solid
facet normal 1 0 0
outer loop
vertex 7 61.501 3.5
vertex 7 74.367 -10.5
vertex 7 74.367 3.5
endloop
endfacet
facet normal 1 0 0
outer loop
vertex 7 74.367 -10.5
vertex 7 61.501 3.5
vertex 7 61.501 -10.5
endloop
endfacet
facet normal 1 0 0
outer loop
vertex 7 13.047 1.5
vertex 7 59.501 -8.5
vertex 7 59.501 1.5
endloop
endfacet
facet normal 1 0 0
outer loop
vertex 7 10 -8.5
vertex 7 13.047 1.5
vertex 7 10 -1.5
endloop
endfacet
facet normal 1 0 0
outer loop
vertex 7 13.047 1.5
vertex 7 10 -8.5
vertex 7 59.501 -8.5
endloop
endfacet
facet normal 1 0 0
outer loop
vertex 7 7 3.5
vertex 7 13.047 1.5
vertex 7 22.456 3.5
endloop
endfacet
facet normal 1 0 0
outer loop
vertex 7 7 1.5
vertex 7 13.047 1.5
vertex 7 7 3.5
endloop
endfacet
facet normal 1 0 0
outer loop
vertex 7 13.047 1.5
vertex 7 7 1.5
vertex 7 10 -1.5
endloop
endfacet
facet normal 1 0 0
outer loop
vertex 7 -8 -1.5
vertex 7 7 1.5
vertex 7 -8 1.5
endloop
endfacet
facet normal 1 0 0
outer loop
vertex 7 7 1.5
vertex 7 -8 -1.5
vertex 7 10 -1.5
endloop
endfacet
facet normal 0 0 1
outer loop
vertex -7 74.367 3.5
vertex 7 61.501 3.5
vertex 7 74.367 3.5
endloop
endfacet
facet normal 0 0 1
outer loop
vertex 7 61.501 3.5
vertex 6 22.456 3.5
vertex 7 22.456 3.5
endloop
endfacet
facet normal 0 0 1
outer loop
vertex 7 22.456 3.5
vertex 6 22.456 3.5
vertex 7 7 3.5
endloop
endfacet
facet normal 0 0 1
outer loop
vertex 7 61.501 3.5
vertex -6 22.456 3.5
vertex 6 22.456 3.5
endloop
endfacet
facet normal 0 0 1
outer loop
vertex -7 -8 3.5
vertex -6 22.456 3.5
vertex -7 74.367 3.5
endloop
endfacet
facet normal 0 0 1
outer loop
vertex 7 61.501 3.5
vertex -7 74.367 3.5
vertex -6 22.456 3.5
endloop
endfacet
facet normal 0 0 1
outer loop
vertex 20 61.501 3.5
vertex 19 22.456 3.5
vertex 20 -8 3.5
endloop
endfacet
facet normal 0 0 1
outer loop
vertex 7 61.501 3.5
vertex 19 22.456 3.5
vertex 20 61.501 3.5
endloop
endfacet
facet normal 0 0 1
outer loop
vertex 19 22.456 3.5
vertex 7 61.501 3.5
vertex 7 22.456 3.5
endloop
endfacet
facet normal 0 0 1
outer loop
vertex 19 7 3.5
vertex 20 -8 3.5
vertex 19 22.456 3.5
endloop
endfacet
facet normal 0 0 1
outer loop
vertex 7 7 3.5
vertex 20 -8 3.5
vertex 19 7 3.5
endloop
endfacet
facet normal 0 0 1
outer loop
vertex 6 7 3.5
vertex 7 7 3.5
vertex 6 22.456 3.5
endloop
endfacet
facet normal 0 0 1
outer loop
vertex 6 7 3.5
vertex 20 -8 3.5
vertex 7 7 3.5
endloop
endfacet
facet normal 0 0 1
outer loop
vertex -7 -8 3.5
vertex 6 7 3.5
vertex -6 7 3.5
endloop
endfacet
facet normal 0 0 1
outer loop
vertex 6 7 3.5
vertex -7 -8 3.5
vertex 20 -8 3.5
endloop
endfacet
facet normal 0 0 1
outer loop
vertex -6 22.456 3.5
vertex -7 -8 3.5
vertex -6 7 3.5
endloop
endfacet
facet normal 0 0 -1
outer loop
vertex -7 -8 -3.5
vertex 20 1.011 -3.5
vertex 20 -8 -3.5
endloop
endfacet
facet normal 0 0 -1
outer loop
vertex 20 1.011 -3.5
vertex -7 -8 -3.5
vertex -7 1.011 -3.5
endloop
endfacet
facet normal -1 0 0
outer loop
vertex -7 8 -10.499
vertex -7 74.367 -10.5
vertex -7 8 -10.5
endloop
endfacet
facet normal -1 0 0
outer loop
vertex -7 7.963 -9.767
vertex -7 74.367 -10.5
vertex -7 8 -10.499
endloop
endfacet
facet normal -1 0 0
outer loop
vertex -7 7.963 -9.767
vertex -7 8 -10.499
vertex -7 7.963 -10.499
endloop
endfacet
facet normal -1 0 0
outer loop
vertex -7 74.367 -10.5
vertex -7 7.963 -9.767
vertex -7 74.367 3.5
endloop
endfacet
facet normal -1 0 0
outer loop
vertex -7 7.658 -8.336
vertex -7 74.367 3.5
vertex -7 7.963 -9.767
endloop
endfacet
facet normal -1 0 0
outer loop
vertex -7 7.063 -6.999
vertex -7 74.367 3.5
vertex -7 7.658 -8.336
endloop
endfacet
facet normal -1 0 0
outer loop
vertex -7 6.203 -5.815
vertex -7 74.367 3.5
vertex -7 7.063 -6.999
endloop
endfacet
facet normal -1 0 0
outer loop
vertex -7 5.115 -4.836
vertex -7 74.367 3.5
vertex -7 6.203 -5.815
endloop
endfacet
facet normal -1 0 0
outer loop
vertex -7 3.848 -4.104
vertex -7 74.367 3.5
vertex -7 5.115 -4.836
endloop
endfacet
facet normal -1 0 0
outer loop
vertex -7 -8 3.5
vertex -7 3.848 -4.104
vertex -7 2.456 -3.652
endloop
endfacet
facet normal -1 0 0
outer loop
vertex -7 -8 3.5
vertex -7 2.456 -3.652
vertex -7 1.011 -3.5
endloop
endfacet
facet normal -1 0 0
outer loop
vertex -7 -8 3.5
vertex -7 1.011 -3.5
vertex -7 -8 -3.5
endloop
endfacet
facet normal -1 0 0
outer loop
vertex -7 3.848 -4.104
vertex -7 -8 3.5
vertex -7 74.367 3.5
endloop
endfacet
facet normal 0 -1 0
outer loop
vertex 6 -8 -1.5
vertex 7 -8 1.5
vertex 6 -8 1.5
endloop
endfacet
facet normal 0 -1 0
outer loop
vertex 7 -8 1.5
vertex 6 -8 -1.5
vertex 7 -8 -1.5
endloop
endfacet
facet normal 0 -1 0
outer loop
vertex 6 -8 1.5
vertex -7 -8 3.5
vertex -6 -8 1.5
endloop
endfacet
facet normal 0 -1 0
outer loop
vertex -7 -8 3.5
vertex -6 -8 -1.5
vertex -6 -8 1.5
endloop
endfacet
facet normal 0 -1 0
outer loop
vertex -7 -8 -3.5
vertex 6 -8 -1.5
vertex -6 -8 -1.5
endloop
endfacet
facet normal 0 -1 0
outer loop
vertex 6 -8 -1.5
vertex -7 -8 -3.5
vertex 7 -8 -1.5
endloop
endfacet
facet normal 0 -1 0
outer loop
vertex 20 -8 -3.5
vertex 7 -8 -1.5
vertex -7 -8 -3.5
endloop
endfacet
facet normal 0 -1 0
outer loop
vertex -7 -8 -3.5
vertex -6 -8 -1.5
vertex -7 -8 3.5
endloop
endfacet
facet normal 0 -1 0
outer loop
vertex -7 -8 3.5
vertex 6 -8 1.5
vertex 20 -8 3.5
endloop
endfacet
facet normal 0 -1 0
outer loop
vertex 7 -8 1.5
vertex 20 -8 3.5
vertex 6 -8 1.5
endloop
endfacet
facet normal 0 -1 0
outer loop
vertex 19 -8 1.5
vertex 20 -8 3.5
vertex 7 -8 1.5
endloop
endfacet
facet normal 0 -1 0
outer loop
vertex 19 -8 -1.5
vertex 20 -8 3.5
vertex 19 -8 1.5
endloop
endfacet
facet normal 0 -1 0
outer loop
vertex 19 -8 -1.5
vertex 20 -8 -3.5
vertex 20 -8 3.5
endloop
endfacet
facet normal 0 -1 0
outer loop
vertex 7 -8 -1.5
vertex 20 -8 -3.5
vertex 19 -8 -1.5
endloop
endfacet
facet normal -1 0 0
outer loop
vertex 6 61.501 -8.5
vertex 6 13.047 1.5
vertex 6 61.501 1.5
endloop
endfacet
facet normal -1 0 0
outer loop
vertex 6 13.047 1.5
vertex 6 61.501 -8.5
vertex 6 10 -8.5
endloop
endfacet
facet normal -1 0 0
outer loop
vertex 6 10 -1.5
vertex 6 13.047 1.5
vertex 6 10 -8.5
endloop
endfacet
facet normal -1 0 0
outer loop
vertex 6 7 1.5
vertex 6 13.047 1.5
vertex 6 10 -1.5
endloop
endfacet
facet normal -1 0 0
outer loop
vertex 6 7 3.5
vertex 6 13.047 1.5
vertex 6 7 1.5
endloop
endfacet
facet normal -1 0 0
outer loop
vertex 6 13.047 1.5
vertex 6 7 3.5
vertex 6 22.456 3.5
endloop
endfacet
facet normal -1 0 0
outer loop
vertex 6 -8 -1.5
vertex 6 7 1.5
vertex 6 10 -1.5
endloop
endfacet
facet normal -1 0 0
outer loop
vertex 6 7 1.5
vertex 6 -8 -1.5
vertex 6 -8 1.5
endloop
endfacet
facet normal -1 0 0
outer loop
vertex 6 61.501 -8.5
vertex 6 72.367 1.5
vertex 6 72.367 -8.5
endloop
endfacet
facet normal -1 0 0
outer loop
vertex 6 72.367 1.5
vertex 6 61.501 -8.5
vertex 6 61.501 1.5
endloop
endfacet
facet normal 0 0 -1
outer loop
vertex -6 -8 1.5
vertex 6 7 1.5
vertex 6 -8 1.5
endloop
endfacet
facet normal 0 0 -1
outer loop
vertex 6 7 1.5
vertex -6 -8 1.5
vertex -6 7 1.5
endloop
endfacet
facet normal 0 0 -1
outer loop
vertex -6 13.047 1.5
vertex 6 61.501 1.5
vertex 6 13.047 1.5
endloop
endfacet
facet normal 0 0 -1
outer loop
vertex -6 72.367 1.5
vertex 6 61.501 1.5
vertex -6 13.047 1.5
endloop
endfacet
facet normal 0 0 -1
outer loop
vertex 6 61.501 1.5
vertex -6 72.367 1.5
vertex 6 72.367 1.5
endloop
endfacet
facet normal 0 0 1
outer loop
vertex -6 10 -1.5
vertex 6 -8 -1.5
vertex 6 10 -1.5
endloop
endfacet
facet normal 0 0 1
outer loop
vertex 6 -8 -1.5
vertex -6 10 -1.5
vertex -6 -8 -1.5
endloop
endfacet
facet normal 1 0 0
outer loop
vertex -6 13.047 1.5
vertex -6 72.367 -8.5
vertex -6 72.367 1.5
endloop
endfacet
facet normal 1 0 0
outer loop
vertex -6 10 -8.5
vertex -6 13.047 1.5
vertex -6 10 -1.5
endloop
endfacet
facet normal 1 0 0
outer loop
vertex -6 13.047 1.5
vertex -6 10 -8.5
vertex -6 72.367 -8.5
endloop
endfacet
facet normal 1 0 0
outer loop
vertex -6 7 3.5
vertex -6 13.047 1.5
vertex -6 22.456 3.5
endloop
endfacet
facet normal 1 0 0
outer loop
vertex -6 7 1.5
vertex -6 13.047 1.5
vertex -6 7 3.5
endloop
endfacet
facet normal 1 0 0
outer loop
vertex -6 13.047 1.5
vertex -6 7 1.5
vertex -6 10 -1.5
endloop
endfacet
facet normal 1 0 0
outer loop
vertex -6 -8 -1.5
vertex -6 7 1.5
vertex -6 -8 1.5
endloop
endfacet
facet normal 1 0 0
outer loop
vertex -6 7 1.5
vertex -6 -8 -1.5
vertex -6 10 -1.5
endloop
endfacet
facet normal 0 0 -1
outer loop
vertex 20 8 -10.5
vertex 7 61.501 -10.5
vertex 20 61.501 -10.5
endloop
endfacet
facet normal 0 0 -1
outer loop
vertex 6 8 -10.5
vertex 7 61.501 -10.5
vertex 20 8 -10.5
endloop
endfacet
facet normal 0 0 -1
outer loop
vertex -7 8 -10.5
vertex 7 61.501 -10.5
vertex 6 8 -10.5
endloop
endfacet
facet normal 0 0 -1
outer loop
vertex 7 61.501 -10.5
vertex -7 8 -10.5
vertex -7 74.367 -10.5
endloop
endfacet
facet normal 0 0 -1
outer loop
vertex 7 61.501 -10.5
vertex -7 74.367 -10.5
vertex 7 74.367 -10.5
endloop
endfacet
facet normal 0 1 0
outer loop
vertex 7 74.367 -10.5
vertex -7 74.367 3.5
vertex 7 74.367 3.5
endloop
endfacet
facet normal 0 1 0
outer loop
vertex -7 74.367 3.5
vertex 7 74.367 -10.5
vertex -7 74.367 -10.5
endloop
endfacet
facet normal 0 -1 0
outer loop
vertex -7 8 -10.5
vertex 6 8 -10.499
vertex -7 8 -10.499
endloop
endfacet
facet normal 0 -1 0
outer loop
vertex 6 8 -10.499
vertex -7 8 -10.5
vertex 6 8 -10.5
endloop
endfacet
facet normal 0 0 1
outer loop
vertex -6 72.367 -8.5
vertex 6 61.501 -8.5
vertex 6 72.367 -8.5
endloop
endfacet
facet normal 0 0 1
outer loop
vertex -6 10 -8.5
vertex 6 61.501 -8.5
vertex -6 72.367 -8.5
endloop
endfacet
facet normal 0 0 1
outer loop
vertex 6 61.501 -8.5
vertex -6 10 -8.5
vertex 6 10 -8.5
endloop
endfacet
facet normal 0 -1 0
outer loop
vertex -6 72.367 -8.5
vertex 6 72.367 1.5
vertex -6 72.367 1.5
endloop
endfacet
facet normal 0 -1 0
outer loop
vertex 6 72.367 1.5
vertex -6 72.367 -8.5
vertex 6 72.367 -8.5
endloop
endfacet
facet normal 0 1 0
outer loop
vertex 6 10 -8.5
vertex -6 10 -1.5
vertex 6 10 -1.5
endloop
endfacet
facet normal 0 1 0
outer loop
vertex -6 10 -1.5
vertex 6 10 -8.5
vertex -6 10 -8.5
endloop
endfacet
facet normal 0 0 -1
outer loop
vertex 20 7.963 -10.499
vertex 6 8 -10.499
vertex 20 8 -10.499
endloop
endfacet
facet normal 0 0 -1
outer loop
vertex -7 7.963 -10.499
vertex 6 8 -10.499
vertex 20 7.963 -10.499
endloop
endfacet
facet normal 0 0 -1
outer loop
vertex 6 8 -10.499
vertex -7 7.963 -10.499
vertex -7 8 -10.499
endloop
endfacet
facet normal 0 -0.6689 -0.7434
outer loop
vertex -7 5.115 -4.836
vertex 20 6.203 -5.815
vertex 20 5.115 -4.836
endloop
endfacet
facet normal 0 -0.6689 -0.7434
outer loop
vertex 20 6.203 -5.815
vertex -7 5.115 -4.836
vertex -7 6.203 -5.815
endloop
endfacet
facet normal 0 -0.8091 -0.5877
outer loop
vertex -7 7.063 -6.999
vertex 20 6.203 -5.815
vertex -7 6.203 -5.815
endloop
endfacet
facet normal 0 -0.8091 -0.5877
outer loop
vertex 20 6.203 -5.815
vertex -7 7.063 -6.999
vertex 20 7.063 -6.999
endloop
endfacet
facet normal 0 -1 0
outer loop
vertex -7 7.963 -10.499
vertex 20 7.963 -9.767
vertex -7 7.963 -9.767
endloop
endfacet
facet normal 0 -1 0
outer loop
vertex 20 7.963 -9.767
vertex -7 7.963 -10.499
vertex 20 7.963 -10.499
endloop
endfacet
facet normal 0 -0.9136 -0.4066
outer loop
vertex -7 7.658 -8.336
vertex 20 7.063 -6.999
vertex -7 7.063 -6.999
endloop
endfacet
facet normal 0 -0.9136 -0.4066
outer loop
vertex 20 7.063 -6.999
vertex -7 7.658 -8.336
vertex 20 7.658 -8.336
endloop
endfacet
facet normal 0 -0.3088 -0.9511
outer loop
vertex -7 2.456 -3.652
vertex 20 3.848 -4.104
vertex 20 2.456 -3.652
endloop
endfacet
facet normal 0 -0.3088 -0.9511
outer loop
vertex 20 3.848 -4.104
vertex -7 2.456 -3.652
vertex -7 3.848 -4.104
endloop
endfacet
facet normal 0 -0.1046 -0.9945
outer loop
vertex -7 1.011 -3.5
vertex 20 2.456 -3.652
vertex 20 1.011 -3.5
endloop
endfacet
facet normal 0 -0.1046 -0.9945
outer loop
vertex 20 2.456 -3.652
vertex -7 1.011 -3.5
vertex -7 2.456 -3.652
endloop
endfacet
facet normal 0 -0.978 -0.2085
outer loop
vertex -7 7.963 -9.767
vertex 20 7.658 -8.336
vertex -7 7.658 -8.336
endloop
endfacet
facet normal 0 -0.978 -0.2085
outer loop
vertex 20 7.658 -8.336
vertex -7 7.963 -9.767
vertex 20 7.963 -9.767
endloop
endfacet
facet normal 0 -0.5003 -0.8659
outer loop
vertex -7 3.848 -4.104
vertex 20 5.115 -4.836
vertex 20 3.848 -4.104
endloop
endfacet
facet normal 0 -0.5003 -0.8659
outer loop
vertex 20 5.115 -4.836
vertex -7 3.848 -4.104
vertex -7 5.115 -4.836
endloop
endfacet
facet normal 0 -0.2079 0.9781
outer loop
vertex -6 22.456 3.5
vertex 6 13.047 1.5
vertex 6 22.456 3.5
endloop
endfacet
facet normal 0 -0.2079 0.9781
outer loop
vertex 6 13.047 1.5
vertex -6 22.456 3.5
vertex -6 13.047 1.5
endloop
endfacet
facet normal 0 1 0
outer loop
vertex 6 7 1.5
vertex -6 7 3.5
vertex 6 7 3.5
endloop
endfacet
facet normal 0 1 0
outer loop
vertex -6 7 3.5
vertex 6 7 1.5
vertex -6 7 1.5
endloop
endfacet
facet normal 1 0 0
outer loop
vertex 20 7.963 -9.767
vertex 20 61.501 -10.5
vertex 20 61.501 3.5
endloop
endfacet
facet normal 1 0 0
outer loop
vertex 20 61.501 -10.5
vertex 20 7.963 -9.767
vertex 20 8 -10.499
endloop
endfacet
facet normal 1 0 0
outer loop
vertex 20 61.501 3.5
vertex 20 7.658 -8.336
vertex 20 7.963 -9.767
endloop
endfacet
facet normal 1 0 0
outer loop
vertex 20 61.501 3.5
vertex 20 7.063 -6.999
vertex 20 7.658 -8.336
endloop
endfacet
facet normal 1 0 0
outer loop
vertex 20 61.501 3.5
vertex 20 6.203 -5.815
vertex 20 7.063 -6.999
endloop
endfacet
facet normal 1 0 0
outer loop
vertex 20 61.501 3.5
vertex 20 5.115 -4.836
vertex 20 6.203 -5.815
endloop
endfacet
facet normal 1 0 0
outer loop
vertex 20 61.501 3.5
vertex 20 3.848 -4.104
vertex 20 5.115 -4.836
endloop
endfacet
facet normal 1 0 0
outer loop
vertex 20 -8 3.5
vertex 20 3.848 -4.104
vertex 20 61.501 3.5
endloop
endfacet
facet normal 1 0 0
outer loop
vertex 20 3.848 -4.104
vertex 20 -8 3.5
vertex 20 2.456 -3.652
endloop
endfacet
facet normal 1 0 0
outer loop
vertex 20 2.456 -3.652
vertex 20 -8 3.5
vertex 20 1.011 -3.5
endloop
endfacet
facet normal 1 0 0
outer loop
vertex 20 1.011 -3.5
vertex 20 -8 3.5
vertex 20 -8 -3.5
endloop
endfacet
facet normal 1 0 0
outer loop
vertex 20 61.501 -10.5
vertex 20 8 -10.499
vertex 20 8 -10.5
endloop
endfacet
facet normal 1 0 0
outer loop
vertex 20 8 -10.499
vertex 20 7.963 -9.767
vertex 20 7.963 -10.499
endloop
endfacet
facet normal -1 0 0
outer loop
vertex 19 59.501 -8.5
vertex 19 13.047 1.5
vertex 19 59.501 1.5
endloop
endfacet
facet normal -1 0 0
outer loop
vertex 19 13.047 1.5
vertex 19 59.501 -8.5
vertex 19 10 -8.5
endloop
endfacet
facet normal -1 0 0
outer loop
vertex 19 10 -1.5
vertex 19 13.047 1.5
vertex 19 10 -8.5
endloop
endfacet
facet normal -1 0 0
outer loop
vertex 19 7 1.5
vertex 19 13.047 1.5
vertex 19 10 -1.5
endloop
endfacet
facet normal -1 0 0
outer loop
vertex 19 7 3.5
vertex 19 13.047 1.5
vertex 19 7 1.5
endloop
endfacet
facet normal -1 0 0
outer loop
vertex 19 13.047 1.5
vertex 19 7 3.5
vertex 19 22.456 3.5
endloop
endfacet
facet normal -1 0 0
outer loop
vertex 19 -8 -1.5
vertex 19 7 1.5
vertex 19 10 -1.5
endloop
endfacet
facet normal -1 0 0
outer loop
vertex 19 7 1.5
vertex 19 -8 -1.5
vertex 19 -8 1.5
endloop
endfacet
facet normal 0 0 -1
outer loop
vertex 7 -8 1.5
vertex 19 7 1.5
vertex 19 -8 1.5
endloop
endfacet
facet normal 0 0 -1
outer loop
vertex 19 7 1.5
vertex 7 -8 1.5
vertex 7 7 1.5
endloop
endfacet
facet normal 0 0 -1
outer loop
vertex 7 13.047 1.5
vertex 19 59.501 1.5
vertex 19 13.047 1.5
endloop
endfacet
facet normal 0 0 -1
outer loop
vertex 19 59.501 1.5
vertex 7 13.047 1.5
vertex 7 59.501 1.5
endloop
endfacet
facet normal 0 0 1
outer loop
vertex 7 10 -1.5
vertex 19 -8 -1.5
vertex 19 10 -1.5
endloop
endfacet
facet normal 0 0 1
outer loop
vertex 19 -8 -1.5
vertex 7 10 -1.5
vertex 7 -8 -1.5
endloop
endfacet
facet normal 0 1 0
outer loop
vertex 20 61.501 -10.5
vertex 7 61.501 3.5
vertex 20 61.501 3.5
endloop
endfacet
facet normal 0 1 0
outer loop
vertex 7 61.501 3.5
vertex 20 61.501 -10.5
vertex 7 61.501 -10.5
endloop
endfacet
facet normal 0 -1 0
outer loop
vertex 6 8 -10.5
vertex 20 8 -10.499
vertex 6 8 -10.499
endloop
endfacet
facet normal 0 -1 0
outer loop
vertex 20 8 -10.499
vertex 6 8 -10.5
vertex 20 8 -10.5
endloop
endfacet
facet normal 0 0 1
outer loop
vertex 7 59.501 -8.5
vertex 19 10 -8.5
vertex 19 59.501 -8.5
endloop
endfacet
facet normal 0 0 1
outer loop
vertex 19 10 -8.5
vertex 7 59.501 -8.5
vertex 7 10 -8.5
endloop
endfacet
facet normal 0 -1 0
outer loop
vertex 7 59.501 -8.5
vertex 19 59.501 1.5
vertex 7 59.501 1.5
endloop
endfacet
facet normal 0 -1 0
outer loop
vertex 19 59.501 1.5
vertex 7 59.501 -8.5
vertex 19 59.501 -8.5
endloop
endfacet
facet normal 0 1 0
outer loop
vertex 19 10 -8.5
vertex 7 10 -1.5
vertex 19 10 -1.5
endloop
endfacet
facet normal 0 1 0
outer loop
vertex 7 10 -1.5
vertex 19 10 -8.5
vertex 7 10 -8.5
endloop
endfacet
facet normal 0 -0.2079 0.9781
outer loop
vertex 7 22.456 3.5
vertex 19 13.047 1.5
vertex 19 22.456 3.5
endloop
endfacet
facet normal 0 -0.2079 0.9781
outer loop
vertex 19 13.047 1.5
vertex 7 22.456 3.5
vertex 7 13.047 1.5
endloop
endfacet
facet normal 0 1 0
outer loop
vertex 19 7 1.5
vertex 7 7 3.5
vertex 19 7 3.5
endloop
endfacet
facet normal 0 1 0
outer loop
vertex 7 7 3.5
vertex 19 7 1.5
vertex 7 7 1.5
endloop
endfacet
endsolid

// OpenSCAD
windway_width=12;
windway_height=3;
windway_length=16;
sidewall=1;
wall=2;
extra=1;
chamber_height=10;
chamber_width=windway_width;

ramp_angle=12;
opening_width=6;
ramp_length=(wall+extra)/tan(ramp_angle);

length_for_a4=176.4;

// notes=[12,14,15,17,19,20,22]; /* A5 B5 C6 D6 E6 F6 G6 */
notes=[18,22];
num_notes=2;

function note_to_freq(halfstep_from_a4) = 440 * pow(1.059463094359, halfstep_from_a4);

function note_to_length(halfstep_from_a4) = 440/note_to_freq(halfstep_from_a4) * length_for_a4;

for (n=[0:num_notes-1]) {
		echo("whistle ",n," is ",note_to_length(notes[n]),"mm long");
		translate([n*(windway_width+sidewall),0,0])
			whistle(note_to_length(notes[n]));
}



module whistle(chamber_length=86) {
	difference() {
		union() {
			translate([0,wall/4,0]) difference() {
				cube([windway_width+sidewall*2,windway_length+wall/2,windway_height+wall*2], center=true);
				cube([windway_width,windway_length+wall/2+extra,windway_height], center=true);
			}
			
			translate([0,chamber_length/2+windway_length/2+wall,-chamber_height/2+windway_height/2]) { 
				difference() {
					cube([chamber_width+sidewall*2, chamber_length+wall*2, chamber_height+wall*2], center=true);
					cube([chamber_width,chamber_length,chamber_height], center=true);
					translate([0,-chamber_length/2-wall/2,chamber_height/2+wall-windway_height/2-wall])
					cube([windway_width, wall*2, windway_height], center=true);
				}
			}

			translate([0,windway_length/2-(chamber_height-windway_height)/2+0.001,-chamber_height/2-wall+0.001]) {
				difference() {
					cube([chamber_width+sidewall*2,chamber_height-windway_height,chamber_height-windway_height], center=true);
					translate([0,-(chamber_height-windway_height)/2,-(chamber_height-windway_height)/2])
						rotate([0,90,0]) 
							cylinder(r=chamber_height-windway_height, h=chamber_width+sidewall*2+1, center=true, $fn=30);
				}
			}

		}
		
		translate([-windway_width/2,windway_length/2+opening_width+wall-opening_width/2,windway_height/2-0.01])
			ramp_cutout();
	}
}

module ramp_cutout() {
		 translate([0,-opening_width,0]) rotate([0,0,90]) rotate([90,0,0]) linear_extrude(height=windway_width)
	 		polygon(points=[[0,0],[opening_width,0],[opening_width+ramp_length,wall+extra],[0,wall+extra]], paths=[[0,1,2,3,0]]);
}
